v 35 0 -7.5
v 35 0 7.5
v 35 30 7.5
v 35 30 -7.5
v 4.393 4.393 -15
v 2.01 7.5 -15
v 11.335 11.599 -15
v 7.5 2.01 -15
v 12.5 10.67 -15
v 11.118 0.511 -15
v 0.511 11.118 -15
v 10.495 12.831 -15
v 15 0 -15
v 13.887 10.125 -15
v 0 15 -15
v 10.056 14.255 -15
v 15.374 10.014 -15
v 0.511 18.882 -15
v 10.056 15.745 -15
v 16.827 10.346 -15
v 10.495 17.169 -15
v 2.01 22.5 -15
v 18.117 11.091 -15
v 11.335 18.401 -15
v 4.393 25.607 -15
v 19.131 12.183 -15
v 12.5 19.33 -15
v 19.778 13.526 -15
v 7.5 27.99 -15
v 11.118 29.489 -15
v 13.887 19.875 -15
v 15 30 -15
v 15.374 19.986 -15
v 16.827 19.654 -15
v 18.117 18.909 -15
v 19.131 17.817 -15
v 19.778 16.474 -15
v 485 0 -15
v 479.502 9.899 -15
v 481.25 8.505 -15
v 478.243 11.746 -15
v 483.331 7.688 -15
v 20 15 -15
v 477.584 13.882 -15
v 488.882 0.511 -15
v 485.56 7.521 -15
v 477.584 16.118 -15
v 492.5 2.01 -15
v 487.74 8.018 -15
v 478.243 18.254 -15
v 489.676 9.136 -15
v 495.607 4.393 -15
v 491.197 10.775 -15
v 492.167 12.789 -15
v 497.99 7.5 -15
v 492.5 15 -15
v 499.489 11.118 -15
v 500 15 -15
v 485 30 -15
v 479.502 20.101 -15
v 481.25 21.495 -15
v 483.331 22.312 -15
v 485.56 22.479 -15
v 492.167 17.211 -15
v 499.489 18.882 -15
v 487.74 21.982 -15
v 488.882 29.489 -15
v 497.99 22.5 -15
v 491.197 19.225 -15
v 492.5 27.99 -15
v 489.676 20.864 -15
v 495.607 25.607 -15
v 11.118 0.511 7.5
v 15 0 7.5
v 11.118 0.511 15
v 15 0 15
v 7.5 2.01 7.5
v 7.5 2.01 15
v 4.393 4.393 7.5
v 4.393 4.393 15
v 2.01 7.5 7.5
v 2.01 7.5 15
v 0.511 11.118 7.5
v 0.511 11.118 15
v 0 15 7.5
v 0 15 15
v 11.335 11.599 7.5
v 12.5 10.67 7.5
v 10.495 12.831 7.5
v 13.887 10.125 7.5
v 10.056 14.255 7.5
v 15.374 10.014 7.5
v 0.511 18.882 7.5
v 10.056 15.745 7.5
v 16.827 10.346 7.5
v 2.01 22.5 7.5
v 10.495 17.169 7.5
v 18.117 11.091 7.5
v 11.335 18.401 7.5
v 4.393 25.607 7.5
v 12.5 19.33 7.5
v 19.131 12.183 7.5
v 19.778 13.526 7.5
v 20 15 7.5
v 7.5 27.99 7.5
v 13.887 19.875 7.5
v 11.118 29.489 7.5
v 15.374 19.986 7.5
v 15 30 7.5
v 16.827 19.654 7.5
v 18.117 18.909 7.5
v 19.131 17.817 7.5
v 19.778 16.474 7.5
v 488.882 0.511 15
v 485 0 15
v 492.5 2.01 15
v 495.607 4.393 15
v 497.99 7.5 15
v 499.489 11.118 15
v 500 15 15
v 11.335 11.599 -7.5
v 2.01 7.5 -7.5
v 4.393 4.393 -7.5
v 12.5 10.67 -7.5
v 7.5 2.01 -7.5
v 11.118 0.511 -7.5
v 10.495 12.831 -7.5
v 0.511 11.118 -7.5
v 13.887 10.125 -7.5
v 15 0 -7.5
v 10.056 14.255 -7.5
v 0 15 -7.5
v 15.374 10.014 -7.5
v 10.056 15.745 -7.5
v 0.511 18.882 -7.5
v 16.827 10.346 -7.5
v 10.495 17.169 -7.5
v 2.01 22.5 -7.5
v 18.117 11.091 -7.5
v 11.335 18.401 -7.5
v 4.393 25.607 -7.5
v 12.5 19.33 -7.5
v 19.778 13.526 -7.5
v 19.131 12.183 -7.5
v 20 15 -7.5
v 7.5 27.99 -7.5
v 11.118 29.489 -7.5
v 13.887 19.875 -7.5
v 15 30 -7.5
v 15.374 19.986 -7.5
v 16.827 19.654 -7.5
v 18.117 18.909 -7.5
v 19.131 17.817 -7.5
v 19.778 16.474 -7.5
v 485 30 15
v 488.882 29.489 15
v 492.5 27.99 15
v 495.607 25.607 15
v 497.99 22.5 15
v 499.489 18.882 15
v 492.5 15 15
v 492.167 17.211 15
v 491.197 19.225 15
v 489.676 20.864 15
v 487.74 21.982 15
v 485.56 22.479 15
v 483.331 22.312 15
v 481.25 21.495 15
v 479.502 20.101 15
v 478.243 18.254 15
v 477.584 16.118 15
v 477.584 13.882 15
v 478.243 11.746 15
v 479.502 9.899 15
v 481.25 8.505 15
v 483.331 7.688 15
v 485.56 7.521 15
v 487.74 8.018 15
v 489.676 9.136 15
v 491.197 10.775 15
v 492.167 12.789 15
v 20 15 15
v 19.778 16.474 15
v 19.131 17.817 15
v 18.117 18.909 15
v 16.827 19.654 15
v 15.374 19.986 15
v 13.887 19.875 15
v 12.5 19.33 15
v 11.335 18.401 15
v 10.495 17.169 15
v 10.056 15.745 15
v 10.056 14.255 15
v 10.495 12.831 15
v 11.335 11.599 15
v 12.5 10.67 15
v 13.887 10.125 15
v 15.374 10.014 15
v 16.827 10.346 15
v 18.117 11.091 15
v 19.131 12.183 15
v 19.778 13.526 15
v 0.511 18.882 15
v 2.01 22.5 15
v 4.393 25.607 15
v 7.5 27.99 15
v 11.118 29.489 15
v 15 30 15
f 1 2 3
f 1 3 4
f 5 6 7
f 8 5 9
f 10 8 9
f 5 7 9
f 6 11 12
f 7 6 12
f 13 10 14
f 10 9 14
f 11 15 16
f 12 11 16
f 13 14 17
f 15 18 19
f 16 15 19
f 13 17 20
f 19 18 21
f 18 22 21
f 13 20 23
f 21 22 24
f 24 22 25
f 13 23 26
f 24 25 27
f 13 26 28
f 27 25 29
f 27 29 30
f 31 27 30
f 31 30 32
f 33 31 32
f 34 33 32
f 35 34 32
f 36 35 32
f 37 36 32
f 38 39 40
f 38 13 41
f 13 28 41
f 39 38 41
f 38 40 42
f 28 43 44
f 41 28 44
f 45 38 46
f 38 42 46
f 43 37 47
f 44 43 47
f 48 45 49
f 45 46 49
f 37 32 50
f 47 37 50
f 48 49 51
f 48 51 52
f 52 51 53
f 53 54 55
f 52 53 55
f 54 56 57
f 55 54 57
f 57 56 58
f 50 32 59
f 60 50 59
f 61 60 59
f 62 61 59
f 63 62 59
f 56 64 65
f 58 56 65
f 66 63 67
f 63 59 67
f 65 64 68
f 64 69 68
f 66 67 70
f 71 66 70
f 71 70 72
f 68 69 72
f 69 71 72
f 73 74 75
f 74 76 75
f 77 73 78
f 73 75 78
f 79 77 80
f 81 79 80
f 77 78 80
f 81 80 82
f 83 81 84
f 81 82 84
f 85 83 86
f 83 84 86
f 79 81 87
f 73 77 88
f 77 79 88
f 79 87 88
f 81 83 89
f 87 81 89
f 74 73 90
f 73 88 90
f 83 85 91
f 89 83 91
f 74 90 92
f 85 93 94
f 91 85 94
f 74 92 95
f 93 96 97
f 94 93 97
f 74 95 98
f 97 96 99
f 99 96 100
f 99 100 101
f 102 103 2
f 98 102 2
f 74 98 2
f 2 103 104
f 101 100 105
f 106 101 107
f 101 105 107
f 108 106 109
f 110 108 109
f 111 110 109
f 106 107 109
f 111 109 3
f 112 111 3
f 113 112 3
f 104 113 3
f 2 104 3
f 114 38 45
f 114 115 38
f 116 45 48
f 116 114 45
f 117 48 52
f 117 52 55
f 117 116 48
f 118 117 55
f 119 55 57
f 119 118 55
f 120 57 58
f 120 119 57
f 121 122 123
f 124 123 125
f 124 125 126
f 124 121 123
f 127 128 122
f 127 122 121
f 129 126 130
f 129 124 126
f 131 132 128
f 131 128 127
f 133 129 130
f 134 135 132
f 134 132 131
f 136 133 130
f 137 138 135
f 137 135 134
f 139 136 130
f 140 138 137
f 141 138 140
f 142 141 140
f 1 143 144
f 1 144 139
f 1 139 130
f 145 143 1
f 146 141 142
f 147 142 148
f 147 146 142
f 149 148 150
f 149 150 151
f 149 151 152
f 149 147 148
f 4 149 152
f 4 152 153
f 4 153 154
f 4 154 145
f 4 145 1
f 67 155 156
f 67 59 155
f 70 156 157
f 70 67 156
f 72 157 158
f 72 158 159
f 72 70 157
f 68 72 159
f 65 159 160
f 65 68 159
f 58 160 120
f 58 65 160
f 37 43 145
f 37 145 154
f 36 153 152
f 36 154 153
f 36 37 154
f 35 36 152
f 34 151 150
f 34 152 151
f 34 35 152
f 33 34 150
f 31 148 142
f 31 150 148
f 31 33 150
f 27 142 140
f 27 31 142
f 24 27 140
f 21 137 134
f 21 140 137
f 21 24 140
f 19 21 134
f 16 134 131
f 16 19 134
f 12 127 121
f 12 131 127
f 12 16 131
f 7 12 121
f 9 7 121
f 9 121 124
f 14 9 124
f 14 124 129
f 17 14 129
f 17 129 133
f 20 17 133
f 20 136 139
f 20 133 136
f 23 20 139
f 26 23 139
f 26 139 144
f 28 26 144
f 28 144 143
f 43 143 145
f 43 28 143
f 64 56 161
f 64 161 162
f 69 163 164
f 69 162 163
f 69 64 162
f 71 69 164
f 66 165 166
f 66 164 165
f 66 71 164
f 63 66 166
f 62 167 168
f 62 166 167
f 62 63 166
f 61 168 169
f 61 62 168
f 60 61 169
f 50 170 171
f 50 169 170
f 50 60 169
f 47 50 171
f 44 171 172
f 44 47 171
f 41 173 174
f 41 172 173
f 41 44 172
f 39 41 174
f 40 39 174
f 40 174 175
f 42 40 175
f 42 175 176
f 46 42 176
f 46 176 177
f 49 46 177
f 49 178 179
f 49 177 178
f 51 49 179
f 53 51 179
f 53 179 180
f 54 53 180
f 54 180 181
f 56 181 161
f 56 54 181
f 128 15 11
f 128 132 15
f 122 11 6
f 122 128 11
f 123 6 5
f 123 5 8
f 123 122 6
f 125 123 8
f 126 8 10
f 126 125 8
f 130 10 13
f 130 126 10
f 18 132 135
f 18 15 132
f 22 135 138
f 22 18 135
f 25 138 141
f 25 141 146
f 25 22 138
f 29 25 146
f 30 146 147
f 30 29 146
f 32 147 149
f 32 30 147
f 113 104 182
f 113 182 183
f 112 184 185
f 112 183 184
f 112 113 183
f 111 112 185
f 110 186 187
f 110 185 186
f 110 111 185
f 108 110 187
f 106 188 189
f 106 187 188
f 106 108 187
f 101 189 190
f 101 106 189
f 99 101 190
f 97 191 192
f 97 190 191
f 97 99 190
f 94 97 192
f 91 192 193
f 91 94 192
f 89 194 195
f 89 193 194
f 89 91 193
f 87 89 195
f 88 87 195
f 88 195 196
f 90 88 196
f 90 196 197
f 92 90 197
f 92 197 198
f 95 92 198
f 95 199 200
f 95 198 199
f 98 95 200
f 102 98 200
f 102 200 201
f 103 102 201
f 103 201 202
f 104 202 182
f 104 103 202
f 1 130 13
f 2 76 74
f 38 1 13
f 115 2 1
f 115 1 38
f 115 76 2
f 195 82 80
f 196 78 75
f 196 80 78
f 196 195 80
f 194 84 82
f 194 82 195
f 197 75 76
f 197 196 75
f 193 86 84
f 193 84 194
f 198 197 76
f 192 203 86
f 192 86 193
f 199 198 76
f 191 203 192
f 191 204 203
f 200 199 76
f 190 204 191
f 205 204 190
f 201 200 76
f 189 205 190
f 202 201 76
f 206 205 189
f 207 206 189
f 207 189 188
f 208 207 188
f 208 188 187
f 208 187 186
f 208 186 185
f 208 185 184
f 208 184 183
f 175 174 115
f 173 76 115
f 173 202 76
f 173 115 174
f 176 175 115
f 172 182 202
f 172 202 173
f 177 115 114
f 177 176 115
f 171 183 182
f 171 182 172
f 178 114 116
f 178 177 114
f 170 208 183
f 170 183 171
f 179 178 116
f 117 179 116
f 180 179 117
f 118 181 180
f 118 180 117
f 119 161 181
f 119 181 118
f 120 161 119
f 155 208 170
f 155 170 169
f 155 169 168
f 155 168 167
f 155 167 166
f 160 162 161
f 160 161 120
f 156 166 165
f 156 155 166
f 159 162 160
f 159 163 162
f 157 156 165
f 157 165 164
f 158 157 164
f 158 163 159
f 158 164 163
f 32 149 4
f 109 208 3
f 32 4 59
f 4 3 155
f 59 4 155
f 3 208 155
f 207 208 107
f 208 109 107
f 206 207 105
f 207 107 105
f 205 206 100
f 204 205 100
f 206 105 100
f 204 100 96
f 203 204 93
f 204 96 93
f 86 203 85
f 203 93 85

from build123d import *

# Parameters (mm, degrees)
SKETCH1_W               = 500
SKETCH1_H               = 30
BOSS_EXTRUDE1_DEPTH     = 15
CUT_EXTRUDE1_REACH      = 503.124
SKETCH2_W               = 35
SKETCH2_H               = 15
CUT_EXTRUDE2_DEPTH      = 502.796771612
CUT_EXTRUDE2_DEPTH_BACK = 502.796771612
SKETCH3_R               = 5
SKETCH3_R_2             = 7.5
FILLET3_R               = 15


with BuildPart() as part:
    # Sketch1 → Boss-Extrude1 (new, symmetric)
    with BuildSketch(Plane.XY):
        with Locations((250, 15)):
            Rectangle(SKETCH1_W, SKETCH1_H)
    extrude(amount=BOSS_EXTRUDE1_DEPTH, both=True)

    # Sketch2 → Cut-Extrude1 (cut, up to next)
    with BuildSketch(Plane(origin=(0, 30, 0), x_dir=(1, 0, 0), z_dir=(0, 1, 0)), mode=Mode.PRIVATE) as cut_extrude1_sk1:
        with Locations((17.5, 0)):
            Rectangle(SKETCH2_W, SKETCH2_H)
    cut_extrude1_tool1 = extrude(cut_extrude1_sk1.sketch, amount=-CUT_EXTRUDE1_REACH, mode=Mode.PRIVATE) & part.part
    add(cut_extrude1_tool1.solids().sort_by_distance((17.5, 30, 0))[0], mode=Mode.SUBTRACT)

    # Sketch3 → Cut-Extrude2 (cut, two sides: drawn at the far end of the back side and taken through both)
    with BuildSketch(Plane.XY.offset(15).offset(-CUT_EXTRUDE2_DEPTH_BACK)):
        with Locations((15, 15)):
            Circle(SKETCH3_R)
        with Locations((485, 15)):
            Circle(SKETCH3_R_2)
    extrude(amount=CUT_EXTRUDE2_DEPTH + CUT_EXTRUDE2_DEPTH_BACK, mode=Mode.SUBTRACT)

    # Fillet3
    fillet3_edges = [part.edges().sort_by_distance(p)[0] for p in [
        (500, 0, 0),
        (500, 30, 0),
        (0, 0, 11.25),
        (0, 0, -11.25),
        (0, 30, -11.25),
        (0, 30, 11.25),
    ]]
    fillet(fillet3_edges, radius=FILLET3_R - 0.0001)  # a hair under: the kernel refuses the full size


solid = part.part
